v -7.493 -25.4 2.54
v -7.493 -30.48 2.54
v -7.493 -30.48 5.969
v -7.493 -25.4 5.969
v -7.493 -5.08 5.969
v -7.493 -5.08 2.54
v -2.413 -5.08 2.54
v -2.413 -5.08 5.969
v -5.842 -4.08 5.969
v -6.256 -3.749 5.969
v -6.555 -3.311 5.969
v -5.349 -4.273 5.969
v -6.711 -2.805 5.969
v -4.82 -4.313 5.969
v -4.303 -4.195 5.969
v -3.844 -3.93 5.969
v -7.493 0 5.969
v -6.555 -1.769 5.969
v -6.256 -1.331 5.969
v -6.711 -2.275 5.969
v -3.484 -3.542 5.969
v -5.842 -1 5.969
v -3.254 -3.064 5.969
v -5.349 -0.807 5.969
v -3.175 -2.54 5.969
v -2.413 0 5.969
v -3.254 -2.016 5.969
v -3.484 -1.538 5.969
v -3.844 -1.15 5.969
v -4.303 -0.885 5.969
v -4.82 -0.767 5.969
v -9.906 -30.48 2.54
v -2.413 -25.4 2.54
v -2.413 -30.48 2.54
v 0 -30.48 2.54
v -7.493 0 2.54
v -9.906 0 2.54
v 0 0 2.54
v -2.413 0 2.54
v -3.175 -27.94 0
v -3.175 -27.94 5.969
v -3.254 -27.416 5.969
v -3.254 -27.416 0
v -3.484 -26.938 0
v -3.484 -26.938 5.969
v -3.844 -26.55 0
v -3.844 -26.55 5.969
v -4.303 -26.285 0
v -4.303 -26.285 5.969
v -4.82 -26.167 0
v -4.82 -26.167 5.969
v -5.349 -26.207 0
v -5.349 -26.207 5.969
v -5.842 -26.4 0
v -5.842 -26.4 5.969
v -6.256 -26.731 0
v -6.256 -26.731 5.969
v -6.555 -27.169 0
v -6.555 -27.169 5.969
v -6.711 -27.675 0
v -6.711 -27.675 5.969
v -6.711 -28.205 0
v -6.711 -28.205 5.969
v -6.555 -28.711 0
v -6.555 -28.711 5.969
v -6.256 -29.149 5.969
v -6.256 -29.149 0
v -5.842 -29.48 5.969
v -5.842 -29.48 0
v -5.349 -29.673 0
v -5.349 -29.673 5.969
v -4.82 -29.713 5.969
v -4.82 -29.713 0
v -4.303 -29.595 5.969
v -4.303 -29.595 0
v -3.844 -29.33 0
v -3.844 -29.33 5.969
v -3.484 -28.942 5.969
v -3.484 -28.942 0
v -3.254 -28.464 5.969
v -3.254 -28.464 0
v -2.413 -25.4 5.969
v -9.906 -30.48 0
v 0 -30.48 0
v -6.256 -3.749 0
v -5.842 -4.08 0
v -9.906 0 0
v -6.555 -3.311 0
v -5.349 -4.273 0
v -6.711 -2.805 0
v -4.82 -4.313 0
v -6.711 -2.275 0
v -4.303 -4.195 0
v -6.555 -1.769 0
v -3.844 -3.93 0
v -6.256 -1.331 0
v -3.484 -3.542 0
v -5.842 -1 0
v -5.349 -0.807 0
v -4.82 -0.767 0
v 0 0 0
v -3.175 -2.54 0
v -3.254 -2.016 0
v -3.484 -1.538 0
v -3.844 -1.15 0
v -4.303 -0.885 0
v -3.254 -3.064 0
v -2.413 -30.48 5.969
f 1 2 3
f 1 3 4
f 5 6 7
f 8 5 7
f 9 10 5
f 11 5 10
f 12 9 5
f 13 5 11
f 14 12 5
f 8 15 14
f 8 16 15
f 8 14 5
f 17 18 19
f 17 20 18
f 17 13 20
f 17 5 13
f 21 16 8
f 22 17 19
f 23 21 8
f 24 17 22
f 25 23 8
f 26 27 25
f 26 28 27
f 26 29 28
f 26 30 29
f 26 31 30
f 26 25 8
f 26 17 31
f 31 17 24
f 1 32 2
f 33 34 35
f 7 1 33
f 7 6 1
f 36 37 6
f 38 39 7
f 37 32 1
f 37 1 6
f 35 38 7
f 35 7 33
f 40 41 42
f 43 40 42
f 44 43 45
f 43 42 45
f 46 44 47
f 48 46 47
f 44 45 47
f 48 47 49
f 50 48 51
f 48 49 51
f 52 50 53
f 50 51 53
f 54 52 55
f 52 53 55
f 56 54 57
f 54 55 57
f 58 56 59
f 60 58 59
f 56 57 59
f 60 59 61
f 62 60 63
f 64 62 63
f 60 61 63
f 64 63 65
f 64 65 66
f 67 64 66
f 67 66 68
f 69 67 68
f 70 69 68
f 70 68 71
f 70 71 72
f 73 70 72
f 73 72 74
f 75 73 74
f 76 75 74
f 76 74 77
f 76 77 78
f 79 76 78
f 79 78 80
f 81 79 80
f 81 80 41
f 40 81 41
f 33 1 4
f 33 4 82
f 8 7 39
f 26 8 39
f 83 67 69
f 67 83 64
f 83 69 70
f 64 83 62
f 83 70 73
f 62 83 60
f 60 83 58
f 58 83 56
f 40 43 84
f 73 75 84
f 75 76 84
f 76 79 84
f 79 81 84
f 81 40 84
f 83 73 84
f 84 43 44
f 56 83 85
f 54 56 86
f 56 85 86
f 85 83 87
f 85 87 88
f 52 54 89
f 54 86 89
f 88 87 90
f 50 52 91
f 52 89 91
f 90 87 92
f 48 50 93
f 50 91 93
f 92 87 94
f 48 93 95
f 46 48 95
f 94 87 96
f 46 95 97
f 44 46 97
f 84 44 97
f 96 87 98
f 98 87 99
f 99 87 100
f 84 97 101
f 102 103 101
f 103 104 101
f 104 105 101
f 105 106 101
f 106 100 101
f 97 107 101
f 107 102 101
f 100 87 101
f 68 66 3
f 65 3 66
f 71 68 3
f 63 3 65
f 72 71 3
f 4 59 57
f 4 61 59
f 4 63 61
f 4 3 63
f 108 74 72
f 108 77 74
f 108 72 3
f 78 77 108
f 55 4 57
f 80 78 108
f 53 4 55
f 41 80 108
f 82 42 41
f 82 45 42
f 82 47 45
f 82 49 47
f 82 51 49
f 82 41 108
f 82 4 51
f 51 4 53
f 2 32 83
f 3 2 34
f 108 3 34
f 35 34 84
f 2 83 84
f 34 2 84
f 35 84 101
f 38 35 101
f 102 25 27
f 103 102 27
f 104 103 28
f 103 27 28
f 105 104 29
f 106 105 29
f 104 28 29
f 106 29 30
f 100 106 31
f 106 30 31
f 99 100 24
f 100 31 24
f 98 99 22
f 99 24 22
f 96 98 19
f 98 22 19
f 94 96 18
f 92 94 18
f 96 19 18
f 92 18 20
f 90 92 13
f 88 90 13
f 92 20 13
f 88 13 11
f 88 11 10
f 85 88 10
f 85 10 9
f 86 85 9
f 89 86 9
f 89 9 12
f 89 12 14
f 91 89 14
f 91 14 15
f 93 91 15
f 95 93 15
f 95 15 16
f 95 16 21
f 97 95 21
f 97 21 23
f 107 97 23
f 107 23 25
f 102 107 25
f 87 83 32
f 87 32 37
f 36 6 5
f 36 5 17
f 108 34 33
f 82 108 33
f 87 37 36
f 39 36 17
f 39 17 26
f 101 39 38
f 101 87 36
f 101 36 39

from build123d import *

# Parameters (mm, degrees)
SKETCH1_W           = 9.906
SKETCH1_H           = 30.48
BOSS_EXTRUDE1_DEPTH = 2.54
SKETCH2_W           = 5.08
SKETCH2_H           = 5.08
BOSS_EXTRUDE2_DEPTH = 3.429
SKETCH3_R           = 1.778
CUT_EXTRUDE1_DEPTH  = 12.7


with BuildPart() as part:
    # Sketch1 → Boss-Extrude1 (new body)
    with BuildSketch(Plane.XY):
        with Locations((-4.953, -15.24)):
            Rectangle(SKETCH1_W, SKETCH1_H)
    extrude(amount=BOSS_EXTRUDE1_DEPTH)

    # Sketch2 → Boss-Extrude2 (add)
    with BuildSketch(Plane.XY.offset(2.54)):
        with Locations((-4.953, -2.54)):
            Rectangle(SKETCH2_W, SKETCH2_H)
        with Locations((-4.953, -27.94)):
            Rectangle(SKETCH2_W, SKETCH2_H)
    extrude(amount=BOSS_EXTRUDE2_DEPTH)

    # Sketch3 → Cut-Extrude1 (cut)
    with BuildSketch(Plane.XY.offset(5.969)):
        with Locations((-4.953, -27.94)):
            Circle(SKETCH3_R)
        with Locations((-4.953, -2.54)):
            Circle(SKETCH3_R)
    extrude(amount=-CUT_EXTRUDE1_DEPTH, mode=Mode.SUBTRACT)


solid = part.part
